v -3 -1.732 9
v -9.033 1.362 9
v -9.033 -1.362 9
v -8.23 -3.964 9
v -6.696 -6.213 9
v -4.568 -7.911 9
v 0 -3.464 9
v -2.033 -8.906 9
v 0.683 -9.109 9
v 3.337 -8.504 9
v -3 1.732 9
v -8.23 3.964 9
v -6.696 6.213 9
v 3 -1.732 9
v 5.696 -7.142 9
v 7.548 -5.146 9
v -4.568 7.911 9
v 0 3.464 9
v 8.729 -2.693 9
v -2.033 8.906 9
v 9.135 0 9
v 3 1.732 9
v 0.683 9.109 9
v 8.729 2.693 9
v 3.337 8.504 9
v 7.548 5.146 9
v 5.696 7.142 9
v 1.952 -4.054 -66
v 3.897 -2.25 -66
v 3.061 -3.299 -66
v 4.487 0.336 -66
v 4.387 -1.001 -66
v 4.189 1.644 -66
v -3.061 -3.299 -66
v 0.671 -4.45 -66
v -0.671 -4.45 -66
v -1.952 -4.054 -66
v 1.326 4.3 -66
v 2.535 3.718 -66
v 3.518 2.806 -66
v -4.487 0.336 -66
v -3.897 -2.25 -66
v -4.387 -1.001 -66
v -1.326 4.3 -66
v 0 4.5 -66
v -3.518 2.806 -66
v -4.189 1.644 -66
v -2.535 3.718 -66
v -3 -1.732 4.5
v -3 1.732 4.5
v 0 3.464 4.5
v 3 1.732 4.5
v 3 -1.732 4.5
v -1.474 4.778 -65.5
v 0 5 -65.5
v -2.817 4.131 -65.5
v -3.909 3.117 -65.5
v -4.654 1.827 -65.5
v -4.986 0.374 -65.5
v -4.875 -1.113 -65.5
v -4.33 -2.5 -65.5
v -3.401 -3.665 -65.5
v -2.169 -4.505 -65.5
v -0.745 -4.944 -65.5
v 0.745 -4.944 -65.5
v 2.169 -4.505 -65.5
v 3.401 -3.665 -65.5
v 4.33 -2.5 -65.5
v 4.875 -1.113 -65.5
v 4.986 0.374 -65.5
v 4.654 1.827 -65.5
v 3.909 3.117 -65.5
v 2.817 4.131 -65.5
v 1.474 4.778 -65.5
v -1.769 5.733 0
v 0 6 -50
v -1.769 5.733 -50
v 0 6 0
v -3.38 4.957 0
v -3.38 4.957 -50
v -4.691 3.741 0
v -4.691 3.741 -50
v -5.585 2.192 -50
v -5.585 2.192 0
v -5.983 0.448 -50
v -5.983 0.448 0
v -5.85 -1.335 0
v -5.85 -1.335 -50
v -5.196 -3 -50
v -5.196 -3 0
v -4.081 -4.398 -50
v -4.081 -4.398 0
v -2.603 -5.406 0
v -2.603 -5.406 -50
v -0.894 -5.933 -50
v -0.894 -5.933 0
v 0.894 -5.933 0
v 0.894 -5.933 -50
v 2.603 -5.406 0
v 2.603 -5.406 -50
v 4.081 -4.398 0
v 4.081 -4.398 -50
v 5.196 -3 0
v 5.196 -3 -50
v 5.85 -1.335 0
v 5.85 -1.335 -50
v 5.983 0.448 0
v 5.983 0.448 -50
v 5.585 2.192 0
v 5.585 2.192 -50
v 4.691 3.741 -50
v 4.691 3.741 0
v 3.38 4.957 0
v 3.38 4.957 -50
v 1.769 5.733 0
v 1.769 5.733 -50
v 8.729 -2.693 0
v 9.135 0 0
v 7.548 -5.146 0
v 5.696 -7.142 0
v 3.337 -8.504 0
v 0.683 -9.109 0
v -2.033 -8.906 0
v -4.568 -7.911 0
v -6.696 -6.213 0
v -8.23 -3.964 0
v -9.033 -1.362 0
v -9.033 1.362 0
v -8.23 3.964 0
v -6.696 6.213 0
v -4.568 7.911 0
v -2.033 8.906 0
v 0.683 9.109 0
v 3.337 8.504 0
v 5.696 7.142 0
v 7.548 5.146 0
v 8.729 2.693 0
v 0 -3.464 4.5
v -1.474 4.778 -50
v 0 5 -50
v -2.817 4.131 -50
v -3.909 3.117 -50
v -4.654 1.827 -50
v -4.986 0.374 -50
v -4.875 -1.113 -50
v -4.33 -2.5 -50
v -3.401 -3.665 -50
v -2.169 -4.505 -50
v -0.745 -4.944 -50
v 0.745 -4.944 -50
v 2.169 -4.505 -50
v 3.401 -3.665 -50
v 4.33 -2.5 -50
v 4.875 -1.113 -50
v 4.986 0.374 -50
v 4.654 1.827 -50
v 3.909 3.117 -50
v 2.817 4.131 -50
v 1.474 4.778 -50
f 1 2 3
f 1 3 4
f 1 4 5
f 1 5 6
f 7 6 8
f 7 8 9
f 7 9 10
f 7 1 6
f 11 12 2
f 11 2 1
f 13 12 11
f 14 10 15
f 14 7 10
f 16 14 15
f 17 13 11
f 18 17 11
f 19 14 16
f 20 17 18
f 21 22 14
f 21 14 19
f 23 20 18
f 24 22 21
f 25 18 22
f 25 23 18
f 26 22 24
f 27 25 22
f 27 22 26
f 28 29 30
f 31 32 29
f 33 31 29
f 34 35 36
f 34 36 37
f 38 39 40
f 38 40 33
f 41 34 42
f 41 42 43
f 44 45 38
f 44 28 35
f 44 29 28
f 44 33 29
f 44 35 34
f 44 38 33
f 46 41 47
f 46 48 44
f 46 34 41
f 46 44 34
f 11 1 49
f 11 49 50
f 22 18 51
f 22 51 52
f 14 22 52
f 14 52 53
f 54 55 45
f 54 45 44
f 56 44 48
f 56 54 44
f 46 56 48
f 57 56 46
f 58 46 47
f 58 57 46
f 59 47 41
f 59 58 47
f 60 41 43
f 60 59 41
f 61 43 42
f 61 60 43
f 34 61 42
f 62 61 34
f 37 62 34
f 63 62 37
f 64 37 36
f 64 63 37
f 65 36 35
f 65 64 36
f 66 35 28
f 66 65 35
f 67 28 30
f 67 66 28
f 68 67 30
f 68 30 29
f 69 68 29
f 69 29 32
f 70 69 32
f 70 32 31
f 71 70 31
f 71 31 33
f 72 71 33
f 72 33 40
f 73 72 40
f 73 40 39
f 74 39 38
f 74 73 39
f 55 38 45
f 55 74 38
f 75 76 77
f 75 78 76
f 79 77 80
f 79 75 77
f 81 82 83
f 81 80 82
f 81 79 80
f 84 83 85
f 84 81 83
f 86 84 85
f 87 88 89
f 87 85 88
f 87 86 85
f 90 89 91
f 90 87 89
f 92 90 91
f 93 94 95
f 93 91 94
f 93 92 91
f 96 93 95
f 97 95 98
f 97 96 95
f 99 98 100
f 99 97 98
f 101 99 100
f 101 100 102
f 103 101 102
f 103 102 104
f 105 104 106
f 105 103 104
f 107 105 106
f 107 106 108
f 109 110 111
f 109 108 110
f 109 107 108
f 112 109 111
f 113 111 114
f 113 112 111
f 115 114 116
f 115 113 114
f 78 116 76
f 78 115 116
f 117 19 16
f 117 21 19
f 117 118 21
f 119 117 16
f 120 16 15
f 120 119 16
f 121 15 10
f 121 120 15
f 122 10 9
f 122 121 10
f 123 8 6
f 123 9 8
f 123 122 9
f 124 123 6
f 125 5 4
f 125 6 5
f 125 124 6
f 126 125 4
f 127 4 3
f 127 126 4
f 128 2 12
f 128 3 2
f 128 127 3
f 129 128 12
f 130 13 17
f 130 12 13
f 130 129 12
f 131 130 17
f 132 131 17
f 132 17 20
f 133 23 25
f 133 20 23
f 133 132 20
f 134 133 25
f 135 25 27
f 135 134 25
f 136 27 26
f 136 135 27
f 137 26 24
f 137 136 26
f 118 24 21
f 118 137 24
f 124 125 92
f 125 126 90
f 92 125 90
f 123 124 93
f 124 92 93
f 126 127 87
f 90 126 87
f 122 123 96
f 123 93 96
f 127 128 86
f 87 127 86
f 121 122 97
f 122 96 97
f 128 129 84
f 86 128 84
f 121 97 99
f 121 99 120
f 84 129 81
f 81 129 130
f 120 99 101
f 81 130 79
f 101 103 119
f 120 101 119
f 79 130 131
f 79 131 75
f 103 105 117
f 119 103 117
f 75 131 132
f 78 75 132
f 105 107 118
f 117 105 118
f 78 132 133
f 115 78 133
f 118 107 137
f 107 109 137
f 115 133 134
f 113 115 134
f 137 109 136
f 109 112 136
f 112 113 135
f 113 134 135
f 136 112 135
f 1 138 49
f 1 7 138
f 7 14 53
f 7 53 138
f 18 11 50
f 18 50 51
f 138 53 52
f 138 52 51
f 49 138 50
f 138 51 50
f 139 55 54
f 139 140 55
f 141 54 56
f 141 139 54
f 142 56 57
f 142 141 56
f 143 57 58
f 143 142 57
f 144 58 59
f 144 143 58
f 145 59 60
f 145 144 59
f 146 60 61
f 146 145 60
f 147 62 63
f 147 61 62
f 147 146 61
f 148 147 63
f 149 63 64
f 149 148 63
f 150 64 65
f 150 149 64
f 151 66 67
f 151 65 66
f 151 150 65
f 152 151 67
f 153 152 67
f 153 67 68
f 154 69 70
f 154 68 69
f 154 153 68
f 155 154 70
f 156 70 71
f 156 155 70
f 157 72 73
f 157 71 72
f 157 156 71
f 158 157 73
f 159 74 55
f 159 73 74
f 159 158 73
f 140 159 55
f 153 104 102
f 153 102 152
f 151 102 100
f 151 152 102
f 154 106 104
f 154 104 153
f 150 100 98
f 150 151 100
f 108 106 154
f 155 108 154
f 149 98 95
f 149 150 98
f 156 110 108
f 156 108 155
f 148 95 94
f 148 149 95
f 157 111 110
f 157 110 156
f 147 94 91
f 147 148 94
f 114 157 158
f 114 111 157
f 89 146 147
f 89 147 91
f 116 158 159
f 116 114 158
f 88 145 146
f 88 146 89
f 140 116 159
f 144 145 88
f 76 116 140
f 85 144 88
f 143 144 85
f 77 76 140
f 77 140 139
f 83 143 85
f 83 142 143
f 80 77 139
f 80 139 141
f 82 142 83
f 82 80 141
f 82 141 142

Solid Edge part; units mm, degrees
sketch "Sketch1" plane through (0, 0, 0) normal (0, 0, 1) x (1, 0, 0)
  circle A0 centre (0, 0) radius 9.135
  dimension "D1" = 18.27
extrude "Protrusion1" add sketch "Sketch1" along normal blind 9
sketch "Sketch2" plane through (0, 0, 9) normal (0, 0, 1) x (1, 0, 0)
  line L0 (0, -3.4641) -> (-3, -1.7321)
  line L1 (-3, -1.7321) -> (-3, 1.7321)
  line L2 (-3, 1.7321) -> (0, 3.4641)
  line L3 (0, 3.4641) -> (3, 1.7321)
  line L4 (3, 1.7321) -> (3, -1.7321)
  line L5 (3, -1.7321) -> (0, -3.4641)
  dimension "D1" = 6
extrude "Cutout1" cut sketch "Sketch2" against normal blind 4.5
sketch "Sketch3" plane through (0, 0, 0) normal (0, 0, -1) x (0, 1, 0)
  circle A0 centre (0, 0) radius 6
  dimension "D1" = 12
extrude "Protrusion2" add sketch "Sketch3" along normal blind 50
sketch "Sketch4" plane through (0, 0, -50) normal (0, 0, -1) x (0, 1, 0)
  circle A0 centre (0, 0) radius 5
  dimension "D1" = 10
extrude "Protrusion3" add sketch "Sketch4" along normal blind 16
chamfer "Chamfer1" distance 0.5 angle 45 1 edges at (0, -5, -66)
properties part number "156599"
